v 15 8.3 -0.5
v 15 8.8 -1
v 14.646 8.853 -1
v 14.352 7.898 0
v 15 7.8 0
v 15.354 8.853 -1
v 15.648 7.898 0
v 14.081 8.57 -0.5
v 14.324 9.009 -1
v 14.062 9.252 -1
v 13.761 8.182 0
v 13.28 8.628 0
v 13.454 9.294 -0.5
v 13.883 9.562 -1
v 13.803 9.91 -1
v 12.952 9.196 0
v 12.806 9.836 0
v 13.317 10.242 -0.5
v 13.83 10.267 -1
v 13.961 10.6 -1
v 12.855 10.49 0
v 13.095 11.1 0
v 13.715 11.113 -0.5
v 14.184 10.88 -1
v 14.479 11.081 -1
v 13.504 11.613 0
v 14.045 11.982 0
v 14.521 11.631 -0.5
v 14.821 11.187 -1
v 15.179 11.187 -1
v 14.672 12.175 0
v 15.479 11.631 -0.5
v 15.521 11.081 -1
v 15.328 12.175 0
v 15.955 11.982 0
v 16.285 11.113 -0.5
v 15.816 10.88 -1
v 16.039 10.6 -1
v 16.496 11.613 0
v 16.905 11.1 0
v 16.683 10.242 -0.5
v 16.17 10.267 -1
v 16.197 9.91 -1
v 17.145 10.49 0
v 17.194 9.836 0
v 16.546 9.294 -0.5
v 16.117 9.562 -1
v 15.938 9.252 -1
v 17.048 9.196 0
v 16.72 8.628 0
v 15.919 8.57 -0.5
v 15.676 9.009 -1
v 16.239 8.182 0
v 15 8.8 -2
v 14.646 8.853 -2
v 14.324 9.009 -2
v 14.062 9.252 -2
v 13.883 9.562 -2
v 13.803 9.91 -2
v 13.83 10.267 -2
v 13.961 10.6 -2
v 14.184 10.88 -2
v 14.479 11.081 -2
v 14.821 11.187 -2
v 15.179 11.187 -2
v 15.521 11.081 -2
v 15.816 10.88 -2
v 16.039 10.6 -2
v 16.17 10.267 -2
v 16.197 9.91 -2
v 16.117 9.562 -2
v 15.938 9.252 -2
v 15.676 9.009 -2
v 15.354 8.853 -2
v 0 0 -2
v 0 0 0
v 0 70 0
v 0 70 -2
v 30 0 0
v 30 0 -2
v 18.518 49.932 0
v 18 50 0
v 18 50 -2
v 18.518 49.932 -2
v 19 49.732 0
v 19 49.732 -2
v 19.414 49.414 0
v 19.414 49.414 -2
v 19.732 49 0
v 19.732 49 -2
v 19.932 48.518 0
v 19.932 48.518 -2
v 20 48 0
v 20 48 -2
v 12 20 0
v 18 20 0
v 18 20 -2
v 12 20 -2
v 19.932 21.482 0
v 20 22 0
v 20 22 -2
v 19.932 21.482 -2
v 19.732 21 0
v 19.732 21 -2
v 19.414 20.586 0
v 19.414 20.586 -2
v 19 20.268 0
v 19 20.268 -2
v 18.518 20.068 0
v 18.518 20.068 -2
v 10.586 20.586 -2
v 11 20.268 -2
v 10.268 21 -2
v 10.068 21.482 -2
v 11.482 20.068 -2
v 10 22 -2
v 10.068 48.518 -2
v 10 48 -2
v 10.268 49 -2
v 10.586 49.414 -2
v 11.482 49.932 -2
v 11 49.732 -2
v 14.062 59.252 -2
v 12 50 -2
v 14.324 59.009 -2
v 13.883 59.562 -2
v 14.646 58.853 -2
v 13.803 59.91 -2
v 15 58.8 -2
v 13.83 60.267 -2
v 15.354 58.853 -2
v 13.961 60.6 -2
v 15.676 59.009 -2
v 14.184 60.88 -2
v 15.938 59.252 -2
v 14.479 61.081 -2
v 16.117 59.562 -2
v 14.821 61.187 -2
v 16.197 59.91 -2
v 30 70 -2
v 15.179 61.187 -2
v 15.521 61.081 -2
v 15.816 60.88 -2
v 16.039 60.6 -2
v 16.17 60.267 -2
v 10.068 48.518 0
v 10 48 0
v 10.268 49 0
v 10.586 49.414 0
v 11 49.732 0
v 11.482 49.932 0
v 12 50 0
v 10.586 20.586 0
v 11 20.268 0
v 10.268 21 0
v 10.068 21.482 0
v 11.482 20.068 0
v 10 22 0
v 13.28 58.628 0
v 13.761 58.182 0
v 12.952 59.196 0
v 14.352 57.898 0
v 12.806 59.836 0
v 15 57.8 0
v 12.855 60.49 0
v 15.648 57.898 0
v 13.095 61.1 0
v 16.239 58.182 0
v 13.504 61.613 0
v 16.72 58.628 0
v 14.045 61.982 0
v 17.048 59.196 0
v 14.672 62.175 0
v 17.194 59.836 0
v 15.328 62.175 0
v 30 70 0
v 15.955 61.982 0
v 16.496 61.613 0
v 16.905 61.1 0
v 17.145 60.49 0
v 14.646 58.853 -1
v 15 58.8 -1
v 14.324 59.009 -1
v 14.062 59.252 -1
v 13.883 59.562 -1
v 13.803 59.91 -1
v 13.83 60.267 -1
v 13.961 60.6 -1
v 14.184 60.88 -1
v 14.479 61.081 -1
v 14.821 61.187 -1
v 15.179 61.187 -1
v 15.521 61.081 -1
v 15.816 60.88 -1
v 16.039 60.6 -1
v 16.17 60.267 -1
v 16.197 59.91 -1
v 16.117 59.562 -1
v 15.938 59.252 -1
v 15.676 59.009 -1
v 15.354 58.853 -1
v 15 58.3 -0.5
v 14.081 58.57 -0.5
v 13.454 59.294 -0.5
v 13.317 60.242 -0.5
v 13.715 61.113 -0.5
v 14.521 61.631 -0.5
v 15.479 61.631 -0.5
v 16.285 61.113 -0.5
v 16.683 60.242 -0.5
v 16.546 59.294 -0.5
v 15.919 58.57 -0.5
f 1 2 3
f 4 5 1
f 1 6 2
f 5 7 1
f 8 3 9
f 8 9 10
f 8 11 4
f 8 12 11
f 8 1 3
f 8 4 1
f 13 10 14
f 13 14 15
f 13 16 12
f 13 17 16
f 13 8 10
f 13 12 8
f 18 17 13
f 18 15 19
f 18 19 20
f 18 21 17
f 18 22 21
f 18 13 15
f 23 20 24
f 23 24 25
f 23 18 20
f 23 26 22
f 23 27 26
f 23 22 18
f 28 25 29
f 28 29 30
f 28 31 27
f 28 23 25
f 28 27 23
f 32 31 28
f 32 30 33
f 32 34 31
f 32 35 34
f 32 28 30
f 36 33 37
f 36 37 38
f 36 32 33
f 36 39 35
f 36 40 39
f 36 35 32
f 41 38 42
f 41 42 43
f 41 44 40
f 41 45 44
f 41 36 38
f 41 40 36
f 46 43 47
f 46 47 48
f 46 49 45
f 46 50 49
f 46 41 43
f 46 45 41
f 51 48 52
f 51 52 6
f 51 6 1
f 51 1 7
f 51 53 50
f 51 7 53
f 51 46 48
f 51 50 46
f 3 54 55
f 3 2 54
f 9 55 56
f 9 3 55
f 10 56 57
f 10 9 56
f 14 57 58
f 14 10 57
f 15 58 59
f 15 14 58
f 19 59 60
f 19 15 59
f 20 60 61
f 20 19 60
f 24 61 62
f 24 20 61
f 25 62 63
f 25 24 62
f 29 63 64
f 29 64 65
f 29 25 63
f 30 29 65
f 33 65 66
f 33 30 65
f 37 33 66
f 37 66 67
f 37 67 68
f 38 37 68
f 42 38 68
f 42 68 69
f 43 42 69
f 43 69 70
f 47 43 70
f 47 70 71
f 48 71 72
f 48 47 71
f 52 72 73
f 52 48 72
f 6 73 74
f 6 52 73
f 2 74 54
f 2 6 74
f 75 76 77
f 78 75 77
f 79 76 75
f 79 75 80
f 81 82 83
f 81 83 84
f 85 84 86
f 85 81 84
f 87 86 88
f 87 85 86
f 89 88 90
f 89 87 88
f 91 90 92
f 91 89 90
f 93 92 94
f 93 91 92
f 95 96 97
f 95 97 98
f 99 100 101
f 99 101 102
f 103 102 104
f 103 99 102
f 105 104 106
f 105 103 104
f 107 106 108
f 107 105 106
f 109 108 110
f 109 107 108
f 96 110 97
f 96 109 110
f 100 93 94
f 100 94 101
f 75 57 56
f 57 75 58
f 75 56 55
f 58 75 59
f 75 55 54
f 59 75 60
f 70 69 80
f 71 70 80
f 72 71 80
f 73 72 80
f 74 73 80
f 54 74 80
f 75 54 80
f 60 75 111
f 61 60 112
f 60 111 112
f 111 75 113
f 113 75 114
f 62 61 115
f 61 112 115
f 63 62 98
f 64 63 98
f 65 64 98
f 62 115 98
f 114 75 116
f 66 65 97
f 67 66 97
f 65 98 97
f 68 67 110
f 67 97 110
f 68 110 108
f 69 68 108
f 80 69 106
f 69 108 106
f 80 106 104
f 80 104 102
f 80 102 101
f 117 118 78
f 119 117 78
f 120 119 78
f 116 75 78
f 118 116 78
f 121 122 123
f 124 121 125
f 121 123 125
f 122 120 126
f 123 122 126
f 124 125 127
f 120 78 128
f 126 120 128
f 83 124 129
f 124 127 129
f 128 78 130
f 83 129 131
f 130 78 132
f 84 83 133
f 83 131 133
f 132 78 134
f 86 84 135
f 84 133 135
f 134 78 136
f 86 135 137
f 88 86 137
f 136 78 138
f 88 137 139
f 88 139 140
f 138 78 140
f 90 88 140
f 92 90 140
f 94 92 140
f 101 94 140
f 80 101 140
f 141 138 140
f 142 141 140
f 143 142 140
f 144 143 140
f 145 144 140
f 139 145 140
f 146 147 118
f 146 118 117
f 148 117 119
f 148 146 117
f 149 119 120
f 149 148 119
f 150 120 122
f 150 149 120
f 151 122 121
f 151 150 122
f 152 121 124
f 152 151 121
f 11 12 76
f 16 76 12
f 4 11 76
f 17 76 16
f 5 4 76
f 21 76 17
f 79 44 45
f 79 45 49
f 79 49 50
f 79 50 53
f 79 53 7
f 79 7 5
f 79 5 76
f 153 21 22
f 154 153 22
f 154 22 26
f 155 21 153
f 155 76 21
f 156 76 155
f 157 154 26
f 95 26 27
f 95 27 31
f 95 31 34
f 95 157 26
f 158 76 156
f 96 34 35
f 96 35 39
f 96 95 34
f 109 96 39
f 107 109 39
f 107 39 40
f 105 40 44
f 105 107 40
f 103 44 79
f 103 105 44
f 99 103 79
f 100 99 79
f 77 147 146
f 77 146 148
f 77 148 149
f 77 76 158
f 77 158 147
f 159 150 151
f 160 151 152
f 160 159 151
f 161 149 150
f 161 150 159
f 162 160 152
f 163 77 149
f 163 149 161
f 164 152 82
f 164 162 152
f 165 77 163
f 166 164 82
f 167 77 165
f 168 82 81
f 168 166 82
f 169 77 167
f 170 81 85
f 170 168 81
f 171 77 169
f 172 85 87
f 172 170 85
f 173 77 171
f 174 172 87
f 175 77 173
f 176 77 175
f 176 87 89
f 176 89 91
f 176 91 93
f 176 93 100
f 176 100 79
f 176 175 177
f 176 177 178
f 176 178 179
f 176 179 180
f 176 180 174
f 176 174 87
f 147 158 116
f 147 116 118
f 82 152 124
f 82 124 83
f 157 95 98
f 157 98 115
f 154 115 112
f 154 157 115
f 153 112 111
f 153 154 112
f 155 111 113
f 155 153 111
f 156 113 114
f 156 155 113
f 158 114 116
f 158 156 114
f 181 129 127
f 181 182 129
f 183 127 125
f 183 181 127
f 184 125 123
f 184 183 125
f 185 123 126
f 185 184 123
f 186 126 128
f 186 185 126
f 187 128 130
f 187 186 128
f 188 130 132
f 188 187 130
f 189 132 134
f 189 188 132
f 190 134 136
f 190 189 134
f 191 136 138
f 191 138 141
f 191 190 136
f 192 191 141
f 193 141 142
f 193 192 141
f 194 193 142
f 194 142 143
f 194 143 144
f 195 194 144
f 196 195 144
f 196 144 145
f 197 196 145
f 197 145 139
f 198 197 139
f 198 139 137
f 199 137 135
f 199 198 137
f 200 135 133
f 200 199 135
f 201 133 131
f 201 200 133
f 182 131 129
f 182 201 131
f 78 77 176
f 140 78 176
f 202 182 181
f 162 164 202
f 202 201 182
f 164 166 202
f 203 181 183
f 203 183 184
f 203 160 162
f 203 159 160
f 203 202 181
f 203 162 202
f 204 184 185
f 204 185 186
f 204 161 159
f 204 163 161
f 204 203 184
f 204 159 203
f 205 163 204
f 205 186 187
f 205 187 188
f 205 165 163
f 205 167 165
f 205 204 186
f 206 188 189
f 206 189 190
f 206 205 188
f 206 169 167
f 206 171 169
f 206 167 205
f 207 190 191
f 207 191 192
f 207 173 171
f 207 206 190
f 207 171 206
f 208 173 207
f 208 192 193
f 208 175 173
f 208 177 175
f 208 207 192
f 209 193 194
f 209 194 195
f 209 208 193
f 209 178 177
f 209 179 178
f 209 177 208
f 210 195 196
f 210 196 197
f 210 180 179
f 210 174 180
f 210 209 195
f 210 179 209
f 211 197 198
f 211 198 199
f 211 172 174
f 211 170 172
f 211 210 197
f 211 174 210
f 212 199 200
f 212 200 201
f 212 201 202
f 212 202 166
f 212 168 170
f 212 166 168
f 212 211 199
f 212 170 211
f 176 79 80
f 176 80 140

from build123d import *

# Parameters (mm, degrees)
SKETCH1_W                                   = 30
SKETCH1_H                                   = 70
EXTRUDE1_DEPTH                              = 2
CSK_FOR_FLAT_HEAD_MACHINE_SCREW1_AT_2_COUNT = 2
CSK_FOR_FLAT_HEAD_MACHINE_SCREW1_AT_2_PITCH = 50


with BuildPart() as part:
    # Sketch1 → Extrude1 (new body)
    with BuildSketch(Plane.XY):
        with Locations((15, 35)):
            Rectangle(SKETCH1_W, SKETCH1_H)
        with BuildLine():
            Line((12, 50), (18, 50))
            ThreePointArc((18, 50), (19.414213562, 49.414213562), (20, 48))
            Line((20, 48), (20, 22))
            ThreePointArc((20, 22), (19.414213562, 20.585786438), (18, 20))
            Line((18, 20), (12, 20))
            ThreePointArc((12, 20), (10.585786438, 20.585786438), (10, 22))
            Line((10, 22), (10, 48))
            ThreePointArc((10, 48), (10.585786438, 49.414213562), (12, 50))
        make_face(mode=Mode.SUBTRACT)
    extrude(amount=-EXTRUDE1_DEPTH)

    # Sketch2 → CSK for  Flat Head Machine Screw1 (revolve, cut)
    with BuildSketch(Plane(origin=(15, 60, 0), x_dir=(0, -1, 0), z_dir=(1, 0, 0))):
        Polygon((0, 0), (0, 2), (1.2, 2), (1.2, 1), (2.2, 0), align=None)
    csk_for_flat_head_machine_screw1 = revolve(axis=Axis((15, 60, 6.35), (0, 0, -1)), mode=Mode.SUBTRACT)

    # CSK for  Flat Head Machine Screw1 at 2: CSK for  Flat Head Machine Screw1 ×2
    with Locations(*[(0, -i * CSK_FOR_FLAT_HEAD_MACHINE_SCREW1_AT_2_PITCH, 0) for i in range(1, CSK_FOR_FLAT_HEAD_MACHINE_SCREW1_AT_2_COUNT)]):
        add(csk_for_flat_head_machine_screw1, mode=Mode.SUBTRACT)


solid = part.part
